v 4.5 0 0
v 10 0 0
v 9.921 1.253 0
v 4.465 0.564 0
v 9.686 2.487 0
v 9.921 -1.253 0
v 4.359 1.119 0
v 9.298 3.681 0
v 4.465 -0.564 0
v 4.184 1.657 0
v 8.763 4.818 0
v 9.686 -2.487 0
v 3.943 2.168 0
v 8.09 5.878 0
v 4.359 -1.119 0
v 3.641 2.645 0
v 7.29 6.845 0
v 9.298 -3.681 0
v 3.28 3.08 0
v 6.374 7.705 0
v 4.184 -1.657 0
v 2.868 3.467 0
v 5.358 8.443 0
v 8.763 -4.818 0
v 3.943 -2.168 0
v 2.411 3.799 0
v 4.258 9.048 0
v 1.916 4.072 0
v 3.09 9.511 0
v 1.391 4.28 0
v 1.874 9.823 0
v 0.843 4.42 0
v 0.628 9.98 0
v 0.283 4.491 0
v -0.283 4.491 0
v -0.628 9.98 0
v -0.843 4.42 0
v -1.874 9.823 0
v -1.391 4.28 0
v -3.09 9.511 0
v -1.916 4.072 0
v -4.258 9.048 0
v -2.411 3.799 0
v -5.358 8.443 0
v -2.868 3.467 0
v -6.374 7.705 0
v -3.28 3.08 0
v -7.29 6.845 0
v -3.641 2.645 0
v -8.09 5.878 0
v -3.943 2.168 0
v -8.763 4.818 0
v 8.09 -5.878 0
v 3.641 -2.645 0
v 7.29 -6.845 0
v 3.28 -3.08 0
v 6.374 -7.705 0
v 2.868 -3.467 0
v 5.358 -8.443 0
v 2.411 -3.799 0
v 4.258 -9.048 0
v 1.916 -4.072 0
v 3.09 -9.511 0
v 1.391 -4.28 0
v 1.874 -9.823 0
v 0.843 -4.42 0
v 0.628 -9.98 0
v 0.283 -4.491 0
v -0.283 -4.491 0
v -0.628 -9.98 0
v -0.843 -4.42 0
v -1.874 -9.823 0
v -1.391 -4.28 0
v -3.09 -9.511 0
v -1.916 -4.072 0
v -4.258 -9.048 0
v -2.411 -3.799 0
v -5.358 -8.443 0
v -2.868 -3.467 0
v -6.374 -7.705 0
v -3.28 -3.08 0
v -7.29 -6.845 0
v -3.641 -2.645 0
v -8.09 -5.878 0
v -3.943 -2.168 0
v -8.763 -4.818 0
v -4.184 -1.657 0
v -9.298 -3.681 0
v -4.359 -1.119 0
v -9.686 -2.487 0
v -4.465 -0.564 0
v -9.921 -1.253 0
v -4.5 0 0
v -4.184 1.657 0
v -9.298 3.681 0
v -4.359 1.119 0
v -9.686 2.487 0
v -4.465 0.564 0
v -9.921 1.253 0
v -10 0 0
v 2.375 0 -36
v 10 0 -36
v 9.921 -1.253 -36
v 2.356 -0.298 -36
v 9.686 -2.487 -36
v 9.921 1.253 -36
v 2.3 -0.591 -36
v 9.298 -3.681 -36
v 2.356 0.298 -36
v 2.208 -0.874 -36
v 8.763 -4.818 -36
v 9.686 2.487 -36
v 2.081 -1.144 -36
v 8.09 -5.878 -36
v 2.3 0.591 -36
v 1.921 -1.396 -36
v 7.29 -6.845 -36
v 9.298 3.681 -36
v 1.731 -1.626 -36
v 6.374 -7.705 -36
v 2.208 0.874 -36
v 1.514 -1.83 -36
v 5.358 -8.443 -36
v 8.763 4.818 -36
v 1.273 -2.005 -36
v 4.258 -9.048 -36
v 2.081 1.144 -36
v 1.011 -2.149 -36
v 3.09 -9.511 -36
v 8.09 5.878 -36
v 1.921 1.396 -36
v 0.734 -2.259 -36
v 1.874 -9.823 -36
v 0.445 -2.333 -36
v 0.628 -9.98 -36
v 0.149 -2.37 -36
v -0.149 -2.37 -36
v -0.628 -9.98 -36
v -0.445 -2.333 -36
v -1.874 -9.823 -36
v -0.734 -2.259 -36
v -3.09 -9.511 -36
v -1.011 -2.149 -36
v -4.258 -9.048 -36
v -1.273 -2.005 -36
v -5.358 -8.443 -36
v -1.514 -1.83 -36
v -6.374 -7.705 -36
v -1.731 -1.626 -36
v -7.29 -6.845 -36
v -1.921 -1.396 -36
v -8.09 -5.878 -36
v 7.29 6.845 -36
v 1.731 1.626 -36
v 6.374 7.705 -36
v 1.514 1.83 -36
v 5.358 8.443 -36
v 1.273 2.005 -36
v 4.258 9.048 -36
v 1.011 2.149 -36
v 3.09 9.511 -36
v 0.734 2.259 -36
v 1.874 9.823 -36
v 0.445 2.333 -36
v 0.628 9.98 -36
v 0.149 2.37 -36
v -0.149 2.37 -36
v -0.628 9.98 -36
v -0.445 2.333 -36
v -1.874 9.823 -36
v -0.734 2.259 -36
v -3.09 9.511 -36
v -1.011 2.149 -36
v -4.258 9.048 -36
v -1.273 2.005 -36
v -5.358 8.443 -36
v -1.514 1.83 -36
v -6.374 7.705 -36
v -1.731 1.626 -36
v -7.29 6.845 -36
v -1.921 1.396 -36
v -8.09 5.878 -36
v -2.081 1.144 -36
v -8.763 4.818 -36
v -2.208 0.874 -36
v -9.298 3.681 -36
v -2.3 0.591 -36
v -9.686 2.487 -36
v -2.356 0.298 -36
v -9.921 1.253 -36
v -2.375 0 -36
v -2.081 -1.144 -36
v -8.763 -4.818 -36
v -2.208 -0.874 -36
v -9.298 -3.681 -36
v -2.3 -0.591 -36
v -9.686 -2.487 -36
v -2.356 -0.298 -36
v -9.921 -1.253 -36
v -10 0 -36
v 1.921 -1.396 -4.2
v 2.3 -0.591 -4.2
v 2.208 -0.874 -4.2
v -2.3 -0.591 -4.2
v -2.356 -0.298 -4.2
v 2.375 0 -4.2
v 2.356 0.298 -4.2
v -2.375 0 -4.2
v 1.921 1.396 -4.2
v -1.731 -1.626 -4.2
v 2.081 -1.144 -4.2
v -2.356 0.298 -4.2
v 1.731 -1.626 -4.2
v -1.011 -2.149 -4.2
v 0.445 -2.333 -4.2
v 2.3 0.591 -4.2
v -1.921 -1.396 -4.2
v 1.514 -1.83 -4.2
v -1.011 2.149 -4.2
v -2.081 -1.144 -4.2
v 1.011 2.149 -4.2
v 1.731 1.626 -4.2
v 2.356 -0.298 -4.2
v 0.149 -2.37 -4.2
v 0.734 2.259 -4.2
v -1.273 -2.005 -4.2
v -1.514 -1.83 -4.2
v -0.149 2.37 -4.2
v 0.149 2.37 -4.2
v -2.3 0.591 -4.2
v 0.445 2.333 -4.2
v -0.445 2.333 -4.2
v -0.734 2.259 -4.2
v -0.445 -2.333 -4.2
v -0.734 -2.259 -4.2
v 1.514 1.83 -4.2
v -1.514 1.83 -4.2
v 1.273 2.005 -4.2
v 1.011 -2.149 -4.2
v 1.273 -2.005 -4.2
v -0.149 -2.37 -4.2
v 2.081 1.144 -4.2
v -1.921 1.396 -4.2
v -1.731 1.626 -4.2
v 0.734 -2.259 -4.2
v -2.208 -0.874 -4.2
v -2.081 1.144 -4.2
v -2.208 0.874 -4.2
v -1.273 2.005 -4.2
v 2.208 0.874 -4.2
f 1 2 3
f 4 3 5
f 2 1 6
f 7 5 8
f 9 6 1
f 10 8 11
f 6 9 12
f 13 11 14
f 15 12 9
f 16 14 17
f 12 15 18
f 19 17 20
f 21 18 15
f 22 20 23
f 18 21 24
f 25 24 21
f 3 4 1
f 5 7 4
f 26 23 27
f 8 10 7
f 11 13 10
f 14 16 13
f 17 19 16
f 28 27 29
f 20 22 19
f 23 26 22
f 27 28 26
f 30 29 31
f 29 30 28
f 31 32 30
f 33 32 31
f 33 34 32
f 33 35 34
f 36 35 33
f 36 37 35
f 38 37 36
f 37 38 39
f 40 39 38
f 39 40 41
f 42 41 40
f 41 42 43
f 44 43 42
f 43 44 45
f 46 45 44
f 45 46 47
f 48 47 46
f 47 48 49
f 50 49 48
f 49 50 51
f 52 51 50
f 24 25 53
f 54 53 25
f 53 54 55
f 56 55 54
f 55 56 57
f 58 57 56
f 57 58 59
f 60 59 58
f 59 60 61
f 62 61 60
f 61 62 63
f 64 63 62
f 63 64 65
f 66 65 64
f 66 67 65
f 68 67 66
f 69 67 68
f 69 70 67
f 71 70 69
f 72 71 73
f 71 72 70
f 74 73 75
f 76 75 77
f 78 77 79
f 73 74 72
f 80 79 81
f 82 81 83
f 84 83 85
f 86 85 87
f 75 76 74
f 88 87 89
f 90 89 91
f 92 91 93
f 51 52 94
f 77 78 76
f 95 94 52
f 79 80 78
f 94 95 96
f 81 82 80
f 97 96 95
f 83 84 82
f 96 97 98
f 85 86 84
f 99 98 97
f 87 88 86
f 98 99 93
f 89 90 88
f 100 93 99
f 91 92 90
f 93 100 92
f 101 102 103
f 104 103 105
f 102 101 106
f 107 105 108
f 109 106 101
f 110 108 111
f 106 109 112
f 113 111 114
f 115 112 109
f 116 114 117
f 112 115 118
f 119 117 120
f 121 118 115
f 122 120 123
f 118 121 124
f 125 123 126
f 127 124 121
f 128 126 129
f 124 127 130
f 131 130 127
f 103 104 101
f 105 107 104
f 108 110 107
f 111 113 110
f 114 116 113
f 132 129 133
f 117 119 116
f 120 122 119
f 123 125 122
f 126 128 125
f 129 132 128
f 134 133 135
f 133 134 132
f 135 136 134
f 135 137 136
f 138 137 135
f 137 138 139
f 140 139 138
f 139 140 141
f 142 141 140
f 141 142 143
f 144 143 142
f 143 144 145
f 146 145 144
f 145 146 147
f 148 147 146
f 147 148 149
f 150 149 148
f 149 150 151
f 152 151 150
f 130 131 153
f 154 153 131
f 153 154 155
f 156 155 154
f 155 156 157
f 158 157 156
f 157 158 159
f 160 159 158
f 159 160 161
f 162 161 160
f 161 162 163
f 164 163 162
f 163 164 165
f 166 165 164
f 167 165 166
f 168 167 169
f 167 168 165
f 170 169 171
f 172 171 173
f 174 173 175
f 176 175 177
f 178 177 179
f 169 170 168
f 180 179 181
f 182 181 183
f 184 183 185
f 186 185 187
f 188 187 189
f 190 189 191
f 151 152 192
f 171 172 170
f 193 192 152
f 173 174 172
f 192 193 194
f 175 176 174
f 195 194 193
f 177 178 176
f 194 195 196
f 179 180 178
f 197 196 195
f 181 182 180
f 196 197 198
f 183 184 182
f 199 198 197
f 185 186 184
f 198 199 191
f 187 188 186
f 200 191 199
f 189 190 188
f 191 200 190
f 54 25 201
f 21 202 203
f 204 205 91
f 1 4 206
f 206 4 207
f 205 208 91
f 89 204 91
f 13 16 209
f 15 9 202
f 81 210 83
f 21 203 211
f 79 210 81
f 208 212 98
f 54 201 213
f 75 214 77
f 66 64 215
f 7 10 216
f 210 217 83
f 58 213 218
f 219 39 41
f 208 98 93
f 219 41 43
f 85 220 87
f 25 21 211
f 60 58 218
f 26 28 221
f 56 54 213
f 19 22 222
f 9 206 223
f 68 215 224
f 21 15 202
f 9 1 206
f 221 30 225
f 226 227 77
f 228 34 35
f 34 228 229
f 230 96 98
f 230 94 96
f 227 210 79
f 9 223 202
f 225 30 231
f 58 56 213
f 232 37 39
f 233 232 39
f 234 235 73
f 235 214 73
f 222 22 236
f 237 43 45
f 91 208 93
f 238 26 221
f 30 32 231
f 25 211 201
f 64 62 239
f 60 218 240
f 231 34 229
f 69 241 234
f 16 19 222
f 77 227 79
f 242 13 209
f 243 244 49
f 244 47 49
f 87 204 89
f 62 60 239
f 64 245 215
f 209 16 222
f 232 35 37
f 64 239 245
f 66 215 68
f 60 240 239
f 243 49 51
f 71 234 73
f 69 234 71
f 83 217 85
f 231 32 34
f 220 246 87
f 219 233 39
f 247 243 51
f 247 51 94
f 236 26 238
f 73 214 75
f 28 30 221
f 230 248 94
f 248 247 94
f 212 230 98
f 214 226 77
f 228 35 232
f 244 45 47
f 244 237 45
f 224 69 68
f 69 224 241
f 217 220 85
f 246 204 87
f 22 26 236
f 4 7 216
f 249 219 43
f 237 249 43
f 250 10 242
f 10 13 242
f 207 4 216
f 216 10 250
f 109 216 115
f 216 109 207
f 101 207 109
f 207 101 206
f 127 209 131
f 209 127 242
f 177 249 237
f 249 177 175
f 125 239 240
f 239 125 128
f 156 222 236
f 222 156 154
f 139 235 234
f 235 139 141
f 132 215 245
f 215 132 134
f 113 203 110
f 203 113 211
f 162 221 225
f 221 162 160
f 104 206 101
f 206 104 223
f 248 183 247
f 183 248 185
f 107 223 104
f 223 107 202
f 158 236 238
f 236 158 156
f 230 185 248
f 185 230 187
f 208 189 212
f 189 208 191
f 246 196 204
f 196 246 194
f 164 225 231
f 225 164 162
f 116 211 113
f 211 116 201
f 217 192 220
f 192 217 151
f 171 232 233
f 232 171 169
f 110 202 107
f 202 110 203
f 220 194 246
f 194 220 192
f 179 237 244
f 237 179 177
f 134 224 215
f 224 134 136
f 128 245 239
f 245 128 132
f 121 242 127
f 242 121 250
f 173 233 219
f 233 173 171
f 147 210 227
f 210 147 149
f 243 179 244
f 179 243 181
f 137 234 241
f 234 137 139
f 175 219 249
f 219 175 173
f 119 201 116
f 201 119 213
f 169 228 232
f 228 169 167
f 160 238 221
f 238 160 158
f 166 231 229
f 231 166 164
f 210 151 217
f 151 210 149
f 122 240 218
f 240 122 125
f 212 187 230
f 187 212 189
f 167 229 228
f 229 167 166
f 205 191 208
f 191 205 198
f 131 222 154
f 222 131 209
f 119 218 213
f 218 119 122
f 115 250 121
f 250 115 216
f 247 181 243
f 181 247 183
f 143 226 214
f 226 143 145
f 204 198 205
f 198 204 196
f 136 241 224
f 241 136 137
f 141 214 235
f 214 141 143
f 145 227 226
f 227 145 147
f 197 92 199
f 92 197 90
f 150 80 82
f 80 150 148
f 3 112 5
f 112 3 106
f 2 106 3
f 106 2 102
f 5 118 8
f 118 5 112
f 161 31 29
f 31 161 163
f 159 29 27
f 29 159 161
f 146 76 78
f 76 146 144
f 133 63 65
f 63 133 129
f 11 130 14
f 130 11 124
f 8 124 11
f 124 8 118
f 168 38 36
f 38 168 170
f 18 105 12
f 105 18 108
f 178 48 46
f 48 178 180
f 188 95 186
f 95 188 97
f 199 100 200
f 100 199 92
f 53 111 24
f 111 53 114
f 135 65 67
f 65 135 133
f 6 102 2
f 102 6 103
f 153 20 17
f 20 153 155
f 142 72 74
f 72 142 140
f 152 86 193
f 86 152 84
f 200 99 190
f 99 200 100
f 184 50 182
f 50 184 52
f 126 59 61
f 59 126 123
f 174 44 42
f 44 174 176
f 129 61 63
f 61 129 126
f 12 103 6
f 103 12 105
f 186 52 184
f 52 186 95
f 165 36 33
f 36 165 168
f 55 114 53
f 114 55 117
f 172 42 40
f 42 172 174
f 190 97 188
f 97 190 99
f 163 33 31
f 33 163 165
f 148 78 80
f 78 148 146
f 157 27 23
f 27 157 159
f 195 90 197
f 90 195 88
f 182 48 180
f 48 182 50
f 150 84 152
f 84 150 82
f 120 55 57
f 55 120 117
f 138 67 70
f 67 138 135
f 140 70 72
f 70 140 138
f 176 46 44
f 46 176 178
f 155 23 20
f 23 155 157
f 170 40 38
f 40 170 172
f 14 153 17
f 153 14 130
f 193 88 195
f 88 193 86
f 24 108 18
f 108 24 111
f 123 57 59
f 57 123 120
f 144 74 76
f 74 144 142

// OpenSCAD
$fn = 50;


difference() {
	union() {
		translate(v = [0, 0, -36.0000000000]) {
			cylinder(h = 36, r = 10.0000000000);
		}
		cylinder(h = 0, r = 13.0000000000);
	}
	union() {
		translate(v = [0, 0, 0]) {
			rotate(a = [0, 0, 0]) {
				difference() {
					union() {
						#translate(v = [0, 0, -36.0000000000]) {
							cylinder(h = 36, r = 2.2500000000);
						}
						#translate(v = [0, 0, -4.2000000000]) {
							cylinder(h = 4.2000000000, r1 = 2.3750000000, r2 = 4.5000000000);
						}
						#translate(v = [0, 0, -36.0000000000]) {
							cylinder(h = 36, r = 2.3750000000);
						}
						#translate(v = [0, 0, -36.0000000000]) {
							cylinder(h = 36, r = 2.2500000000);
						}
					}
					union();
				}
			}
		}
	}
}
